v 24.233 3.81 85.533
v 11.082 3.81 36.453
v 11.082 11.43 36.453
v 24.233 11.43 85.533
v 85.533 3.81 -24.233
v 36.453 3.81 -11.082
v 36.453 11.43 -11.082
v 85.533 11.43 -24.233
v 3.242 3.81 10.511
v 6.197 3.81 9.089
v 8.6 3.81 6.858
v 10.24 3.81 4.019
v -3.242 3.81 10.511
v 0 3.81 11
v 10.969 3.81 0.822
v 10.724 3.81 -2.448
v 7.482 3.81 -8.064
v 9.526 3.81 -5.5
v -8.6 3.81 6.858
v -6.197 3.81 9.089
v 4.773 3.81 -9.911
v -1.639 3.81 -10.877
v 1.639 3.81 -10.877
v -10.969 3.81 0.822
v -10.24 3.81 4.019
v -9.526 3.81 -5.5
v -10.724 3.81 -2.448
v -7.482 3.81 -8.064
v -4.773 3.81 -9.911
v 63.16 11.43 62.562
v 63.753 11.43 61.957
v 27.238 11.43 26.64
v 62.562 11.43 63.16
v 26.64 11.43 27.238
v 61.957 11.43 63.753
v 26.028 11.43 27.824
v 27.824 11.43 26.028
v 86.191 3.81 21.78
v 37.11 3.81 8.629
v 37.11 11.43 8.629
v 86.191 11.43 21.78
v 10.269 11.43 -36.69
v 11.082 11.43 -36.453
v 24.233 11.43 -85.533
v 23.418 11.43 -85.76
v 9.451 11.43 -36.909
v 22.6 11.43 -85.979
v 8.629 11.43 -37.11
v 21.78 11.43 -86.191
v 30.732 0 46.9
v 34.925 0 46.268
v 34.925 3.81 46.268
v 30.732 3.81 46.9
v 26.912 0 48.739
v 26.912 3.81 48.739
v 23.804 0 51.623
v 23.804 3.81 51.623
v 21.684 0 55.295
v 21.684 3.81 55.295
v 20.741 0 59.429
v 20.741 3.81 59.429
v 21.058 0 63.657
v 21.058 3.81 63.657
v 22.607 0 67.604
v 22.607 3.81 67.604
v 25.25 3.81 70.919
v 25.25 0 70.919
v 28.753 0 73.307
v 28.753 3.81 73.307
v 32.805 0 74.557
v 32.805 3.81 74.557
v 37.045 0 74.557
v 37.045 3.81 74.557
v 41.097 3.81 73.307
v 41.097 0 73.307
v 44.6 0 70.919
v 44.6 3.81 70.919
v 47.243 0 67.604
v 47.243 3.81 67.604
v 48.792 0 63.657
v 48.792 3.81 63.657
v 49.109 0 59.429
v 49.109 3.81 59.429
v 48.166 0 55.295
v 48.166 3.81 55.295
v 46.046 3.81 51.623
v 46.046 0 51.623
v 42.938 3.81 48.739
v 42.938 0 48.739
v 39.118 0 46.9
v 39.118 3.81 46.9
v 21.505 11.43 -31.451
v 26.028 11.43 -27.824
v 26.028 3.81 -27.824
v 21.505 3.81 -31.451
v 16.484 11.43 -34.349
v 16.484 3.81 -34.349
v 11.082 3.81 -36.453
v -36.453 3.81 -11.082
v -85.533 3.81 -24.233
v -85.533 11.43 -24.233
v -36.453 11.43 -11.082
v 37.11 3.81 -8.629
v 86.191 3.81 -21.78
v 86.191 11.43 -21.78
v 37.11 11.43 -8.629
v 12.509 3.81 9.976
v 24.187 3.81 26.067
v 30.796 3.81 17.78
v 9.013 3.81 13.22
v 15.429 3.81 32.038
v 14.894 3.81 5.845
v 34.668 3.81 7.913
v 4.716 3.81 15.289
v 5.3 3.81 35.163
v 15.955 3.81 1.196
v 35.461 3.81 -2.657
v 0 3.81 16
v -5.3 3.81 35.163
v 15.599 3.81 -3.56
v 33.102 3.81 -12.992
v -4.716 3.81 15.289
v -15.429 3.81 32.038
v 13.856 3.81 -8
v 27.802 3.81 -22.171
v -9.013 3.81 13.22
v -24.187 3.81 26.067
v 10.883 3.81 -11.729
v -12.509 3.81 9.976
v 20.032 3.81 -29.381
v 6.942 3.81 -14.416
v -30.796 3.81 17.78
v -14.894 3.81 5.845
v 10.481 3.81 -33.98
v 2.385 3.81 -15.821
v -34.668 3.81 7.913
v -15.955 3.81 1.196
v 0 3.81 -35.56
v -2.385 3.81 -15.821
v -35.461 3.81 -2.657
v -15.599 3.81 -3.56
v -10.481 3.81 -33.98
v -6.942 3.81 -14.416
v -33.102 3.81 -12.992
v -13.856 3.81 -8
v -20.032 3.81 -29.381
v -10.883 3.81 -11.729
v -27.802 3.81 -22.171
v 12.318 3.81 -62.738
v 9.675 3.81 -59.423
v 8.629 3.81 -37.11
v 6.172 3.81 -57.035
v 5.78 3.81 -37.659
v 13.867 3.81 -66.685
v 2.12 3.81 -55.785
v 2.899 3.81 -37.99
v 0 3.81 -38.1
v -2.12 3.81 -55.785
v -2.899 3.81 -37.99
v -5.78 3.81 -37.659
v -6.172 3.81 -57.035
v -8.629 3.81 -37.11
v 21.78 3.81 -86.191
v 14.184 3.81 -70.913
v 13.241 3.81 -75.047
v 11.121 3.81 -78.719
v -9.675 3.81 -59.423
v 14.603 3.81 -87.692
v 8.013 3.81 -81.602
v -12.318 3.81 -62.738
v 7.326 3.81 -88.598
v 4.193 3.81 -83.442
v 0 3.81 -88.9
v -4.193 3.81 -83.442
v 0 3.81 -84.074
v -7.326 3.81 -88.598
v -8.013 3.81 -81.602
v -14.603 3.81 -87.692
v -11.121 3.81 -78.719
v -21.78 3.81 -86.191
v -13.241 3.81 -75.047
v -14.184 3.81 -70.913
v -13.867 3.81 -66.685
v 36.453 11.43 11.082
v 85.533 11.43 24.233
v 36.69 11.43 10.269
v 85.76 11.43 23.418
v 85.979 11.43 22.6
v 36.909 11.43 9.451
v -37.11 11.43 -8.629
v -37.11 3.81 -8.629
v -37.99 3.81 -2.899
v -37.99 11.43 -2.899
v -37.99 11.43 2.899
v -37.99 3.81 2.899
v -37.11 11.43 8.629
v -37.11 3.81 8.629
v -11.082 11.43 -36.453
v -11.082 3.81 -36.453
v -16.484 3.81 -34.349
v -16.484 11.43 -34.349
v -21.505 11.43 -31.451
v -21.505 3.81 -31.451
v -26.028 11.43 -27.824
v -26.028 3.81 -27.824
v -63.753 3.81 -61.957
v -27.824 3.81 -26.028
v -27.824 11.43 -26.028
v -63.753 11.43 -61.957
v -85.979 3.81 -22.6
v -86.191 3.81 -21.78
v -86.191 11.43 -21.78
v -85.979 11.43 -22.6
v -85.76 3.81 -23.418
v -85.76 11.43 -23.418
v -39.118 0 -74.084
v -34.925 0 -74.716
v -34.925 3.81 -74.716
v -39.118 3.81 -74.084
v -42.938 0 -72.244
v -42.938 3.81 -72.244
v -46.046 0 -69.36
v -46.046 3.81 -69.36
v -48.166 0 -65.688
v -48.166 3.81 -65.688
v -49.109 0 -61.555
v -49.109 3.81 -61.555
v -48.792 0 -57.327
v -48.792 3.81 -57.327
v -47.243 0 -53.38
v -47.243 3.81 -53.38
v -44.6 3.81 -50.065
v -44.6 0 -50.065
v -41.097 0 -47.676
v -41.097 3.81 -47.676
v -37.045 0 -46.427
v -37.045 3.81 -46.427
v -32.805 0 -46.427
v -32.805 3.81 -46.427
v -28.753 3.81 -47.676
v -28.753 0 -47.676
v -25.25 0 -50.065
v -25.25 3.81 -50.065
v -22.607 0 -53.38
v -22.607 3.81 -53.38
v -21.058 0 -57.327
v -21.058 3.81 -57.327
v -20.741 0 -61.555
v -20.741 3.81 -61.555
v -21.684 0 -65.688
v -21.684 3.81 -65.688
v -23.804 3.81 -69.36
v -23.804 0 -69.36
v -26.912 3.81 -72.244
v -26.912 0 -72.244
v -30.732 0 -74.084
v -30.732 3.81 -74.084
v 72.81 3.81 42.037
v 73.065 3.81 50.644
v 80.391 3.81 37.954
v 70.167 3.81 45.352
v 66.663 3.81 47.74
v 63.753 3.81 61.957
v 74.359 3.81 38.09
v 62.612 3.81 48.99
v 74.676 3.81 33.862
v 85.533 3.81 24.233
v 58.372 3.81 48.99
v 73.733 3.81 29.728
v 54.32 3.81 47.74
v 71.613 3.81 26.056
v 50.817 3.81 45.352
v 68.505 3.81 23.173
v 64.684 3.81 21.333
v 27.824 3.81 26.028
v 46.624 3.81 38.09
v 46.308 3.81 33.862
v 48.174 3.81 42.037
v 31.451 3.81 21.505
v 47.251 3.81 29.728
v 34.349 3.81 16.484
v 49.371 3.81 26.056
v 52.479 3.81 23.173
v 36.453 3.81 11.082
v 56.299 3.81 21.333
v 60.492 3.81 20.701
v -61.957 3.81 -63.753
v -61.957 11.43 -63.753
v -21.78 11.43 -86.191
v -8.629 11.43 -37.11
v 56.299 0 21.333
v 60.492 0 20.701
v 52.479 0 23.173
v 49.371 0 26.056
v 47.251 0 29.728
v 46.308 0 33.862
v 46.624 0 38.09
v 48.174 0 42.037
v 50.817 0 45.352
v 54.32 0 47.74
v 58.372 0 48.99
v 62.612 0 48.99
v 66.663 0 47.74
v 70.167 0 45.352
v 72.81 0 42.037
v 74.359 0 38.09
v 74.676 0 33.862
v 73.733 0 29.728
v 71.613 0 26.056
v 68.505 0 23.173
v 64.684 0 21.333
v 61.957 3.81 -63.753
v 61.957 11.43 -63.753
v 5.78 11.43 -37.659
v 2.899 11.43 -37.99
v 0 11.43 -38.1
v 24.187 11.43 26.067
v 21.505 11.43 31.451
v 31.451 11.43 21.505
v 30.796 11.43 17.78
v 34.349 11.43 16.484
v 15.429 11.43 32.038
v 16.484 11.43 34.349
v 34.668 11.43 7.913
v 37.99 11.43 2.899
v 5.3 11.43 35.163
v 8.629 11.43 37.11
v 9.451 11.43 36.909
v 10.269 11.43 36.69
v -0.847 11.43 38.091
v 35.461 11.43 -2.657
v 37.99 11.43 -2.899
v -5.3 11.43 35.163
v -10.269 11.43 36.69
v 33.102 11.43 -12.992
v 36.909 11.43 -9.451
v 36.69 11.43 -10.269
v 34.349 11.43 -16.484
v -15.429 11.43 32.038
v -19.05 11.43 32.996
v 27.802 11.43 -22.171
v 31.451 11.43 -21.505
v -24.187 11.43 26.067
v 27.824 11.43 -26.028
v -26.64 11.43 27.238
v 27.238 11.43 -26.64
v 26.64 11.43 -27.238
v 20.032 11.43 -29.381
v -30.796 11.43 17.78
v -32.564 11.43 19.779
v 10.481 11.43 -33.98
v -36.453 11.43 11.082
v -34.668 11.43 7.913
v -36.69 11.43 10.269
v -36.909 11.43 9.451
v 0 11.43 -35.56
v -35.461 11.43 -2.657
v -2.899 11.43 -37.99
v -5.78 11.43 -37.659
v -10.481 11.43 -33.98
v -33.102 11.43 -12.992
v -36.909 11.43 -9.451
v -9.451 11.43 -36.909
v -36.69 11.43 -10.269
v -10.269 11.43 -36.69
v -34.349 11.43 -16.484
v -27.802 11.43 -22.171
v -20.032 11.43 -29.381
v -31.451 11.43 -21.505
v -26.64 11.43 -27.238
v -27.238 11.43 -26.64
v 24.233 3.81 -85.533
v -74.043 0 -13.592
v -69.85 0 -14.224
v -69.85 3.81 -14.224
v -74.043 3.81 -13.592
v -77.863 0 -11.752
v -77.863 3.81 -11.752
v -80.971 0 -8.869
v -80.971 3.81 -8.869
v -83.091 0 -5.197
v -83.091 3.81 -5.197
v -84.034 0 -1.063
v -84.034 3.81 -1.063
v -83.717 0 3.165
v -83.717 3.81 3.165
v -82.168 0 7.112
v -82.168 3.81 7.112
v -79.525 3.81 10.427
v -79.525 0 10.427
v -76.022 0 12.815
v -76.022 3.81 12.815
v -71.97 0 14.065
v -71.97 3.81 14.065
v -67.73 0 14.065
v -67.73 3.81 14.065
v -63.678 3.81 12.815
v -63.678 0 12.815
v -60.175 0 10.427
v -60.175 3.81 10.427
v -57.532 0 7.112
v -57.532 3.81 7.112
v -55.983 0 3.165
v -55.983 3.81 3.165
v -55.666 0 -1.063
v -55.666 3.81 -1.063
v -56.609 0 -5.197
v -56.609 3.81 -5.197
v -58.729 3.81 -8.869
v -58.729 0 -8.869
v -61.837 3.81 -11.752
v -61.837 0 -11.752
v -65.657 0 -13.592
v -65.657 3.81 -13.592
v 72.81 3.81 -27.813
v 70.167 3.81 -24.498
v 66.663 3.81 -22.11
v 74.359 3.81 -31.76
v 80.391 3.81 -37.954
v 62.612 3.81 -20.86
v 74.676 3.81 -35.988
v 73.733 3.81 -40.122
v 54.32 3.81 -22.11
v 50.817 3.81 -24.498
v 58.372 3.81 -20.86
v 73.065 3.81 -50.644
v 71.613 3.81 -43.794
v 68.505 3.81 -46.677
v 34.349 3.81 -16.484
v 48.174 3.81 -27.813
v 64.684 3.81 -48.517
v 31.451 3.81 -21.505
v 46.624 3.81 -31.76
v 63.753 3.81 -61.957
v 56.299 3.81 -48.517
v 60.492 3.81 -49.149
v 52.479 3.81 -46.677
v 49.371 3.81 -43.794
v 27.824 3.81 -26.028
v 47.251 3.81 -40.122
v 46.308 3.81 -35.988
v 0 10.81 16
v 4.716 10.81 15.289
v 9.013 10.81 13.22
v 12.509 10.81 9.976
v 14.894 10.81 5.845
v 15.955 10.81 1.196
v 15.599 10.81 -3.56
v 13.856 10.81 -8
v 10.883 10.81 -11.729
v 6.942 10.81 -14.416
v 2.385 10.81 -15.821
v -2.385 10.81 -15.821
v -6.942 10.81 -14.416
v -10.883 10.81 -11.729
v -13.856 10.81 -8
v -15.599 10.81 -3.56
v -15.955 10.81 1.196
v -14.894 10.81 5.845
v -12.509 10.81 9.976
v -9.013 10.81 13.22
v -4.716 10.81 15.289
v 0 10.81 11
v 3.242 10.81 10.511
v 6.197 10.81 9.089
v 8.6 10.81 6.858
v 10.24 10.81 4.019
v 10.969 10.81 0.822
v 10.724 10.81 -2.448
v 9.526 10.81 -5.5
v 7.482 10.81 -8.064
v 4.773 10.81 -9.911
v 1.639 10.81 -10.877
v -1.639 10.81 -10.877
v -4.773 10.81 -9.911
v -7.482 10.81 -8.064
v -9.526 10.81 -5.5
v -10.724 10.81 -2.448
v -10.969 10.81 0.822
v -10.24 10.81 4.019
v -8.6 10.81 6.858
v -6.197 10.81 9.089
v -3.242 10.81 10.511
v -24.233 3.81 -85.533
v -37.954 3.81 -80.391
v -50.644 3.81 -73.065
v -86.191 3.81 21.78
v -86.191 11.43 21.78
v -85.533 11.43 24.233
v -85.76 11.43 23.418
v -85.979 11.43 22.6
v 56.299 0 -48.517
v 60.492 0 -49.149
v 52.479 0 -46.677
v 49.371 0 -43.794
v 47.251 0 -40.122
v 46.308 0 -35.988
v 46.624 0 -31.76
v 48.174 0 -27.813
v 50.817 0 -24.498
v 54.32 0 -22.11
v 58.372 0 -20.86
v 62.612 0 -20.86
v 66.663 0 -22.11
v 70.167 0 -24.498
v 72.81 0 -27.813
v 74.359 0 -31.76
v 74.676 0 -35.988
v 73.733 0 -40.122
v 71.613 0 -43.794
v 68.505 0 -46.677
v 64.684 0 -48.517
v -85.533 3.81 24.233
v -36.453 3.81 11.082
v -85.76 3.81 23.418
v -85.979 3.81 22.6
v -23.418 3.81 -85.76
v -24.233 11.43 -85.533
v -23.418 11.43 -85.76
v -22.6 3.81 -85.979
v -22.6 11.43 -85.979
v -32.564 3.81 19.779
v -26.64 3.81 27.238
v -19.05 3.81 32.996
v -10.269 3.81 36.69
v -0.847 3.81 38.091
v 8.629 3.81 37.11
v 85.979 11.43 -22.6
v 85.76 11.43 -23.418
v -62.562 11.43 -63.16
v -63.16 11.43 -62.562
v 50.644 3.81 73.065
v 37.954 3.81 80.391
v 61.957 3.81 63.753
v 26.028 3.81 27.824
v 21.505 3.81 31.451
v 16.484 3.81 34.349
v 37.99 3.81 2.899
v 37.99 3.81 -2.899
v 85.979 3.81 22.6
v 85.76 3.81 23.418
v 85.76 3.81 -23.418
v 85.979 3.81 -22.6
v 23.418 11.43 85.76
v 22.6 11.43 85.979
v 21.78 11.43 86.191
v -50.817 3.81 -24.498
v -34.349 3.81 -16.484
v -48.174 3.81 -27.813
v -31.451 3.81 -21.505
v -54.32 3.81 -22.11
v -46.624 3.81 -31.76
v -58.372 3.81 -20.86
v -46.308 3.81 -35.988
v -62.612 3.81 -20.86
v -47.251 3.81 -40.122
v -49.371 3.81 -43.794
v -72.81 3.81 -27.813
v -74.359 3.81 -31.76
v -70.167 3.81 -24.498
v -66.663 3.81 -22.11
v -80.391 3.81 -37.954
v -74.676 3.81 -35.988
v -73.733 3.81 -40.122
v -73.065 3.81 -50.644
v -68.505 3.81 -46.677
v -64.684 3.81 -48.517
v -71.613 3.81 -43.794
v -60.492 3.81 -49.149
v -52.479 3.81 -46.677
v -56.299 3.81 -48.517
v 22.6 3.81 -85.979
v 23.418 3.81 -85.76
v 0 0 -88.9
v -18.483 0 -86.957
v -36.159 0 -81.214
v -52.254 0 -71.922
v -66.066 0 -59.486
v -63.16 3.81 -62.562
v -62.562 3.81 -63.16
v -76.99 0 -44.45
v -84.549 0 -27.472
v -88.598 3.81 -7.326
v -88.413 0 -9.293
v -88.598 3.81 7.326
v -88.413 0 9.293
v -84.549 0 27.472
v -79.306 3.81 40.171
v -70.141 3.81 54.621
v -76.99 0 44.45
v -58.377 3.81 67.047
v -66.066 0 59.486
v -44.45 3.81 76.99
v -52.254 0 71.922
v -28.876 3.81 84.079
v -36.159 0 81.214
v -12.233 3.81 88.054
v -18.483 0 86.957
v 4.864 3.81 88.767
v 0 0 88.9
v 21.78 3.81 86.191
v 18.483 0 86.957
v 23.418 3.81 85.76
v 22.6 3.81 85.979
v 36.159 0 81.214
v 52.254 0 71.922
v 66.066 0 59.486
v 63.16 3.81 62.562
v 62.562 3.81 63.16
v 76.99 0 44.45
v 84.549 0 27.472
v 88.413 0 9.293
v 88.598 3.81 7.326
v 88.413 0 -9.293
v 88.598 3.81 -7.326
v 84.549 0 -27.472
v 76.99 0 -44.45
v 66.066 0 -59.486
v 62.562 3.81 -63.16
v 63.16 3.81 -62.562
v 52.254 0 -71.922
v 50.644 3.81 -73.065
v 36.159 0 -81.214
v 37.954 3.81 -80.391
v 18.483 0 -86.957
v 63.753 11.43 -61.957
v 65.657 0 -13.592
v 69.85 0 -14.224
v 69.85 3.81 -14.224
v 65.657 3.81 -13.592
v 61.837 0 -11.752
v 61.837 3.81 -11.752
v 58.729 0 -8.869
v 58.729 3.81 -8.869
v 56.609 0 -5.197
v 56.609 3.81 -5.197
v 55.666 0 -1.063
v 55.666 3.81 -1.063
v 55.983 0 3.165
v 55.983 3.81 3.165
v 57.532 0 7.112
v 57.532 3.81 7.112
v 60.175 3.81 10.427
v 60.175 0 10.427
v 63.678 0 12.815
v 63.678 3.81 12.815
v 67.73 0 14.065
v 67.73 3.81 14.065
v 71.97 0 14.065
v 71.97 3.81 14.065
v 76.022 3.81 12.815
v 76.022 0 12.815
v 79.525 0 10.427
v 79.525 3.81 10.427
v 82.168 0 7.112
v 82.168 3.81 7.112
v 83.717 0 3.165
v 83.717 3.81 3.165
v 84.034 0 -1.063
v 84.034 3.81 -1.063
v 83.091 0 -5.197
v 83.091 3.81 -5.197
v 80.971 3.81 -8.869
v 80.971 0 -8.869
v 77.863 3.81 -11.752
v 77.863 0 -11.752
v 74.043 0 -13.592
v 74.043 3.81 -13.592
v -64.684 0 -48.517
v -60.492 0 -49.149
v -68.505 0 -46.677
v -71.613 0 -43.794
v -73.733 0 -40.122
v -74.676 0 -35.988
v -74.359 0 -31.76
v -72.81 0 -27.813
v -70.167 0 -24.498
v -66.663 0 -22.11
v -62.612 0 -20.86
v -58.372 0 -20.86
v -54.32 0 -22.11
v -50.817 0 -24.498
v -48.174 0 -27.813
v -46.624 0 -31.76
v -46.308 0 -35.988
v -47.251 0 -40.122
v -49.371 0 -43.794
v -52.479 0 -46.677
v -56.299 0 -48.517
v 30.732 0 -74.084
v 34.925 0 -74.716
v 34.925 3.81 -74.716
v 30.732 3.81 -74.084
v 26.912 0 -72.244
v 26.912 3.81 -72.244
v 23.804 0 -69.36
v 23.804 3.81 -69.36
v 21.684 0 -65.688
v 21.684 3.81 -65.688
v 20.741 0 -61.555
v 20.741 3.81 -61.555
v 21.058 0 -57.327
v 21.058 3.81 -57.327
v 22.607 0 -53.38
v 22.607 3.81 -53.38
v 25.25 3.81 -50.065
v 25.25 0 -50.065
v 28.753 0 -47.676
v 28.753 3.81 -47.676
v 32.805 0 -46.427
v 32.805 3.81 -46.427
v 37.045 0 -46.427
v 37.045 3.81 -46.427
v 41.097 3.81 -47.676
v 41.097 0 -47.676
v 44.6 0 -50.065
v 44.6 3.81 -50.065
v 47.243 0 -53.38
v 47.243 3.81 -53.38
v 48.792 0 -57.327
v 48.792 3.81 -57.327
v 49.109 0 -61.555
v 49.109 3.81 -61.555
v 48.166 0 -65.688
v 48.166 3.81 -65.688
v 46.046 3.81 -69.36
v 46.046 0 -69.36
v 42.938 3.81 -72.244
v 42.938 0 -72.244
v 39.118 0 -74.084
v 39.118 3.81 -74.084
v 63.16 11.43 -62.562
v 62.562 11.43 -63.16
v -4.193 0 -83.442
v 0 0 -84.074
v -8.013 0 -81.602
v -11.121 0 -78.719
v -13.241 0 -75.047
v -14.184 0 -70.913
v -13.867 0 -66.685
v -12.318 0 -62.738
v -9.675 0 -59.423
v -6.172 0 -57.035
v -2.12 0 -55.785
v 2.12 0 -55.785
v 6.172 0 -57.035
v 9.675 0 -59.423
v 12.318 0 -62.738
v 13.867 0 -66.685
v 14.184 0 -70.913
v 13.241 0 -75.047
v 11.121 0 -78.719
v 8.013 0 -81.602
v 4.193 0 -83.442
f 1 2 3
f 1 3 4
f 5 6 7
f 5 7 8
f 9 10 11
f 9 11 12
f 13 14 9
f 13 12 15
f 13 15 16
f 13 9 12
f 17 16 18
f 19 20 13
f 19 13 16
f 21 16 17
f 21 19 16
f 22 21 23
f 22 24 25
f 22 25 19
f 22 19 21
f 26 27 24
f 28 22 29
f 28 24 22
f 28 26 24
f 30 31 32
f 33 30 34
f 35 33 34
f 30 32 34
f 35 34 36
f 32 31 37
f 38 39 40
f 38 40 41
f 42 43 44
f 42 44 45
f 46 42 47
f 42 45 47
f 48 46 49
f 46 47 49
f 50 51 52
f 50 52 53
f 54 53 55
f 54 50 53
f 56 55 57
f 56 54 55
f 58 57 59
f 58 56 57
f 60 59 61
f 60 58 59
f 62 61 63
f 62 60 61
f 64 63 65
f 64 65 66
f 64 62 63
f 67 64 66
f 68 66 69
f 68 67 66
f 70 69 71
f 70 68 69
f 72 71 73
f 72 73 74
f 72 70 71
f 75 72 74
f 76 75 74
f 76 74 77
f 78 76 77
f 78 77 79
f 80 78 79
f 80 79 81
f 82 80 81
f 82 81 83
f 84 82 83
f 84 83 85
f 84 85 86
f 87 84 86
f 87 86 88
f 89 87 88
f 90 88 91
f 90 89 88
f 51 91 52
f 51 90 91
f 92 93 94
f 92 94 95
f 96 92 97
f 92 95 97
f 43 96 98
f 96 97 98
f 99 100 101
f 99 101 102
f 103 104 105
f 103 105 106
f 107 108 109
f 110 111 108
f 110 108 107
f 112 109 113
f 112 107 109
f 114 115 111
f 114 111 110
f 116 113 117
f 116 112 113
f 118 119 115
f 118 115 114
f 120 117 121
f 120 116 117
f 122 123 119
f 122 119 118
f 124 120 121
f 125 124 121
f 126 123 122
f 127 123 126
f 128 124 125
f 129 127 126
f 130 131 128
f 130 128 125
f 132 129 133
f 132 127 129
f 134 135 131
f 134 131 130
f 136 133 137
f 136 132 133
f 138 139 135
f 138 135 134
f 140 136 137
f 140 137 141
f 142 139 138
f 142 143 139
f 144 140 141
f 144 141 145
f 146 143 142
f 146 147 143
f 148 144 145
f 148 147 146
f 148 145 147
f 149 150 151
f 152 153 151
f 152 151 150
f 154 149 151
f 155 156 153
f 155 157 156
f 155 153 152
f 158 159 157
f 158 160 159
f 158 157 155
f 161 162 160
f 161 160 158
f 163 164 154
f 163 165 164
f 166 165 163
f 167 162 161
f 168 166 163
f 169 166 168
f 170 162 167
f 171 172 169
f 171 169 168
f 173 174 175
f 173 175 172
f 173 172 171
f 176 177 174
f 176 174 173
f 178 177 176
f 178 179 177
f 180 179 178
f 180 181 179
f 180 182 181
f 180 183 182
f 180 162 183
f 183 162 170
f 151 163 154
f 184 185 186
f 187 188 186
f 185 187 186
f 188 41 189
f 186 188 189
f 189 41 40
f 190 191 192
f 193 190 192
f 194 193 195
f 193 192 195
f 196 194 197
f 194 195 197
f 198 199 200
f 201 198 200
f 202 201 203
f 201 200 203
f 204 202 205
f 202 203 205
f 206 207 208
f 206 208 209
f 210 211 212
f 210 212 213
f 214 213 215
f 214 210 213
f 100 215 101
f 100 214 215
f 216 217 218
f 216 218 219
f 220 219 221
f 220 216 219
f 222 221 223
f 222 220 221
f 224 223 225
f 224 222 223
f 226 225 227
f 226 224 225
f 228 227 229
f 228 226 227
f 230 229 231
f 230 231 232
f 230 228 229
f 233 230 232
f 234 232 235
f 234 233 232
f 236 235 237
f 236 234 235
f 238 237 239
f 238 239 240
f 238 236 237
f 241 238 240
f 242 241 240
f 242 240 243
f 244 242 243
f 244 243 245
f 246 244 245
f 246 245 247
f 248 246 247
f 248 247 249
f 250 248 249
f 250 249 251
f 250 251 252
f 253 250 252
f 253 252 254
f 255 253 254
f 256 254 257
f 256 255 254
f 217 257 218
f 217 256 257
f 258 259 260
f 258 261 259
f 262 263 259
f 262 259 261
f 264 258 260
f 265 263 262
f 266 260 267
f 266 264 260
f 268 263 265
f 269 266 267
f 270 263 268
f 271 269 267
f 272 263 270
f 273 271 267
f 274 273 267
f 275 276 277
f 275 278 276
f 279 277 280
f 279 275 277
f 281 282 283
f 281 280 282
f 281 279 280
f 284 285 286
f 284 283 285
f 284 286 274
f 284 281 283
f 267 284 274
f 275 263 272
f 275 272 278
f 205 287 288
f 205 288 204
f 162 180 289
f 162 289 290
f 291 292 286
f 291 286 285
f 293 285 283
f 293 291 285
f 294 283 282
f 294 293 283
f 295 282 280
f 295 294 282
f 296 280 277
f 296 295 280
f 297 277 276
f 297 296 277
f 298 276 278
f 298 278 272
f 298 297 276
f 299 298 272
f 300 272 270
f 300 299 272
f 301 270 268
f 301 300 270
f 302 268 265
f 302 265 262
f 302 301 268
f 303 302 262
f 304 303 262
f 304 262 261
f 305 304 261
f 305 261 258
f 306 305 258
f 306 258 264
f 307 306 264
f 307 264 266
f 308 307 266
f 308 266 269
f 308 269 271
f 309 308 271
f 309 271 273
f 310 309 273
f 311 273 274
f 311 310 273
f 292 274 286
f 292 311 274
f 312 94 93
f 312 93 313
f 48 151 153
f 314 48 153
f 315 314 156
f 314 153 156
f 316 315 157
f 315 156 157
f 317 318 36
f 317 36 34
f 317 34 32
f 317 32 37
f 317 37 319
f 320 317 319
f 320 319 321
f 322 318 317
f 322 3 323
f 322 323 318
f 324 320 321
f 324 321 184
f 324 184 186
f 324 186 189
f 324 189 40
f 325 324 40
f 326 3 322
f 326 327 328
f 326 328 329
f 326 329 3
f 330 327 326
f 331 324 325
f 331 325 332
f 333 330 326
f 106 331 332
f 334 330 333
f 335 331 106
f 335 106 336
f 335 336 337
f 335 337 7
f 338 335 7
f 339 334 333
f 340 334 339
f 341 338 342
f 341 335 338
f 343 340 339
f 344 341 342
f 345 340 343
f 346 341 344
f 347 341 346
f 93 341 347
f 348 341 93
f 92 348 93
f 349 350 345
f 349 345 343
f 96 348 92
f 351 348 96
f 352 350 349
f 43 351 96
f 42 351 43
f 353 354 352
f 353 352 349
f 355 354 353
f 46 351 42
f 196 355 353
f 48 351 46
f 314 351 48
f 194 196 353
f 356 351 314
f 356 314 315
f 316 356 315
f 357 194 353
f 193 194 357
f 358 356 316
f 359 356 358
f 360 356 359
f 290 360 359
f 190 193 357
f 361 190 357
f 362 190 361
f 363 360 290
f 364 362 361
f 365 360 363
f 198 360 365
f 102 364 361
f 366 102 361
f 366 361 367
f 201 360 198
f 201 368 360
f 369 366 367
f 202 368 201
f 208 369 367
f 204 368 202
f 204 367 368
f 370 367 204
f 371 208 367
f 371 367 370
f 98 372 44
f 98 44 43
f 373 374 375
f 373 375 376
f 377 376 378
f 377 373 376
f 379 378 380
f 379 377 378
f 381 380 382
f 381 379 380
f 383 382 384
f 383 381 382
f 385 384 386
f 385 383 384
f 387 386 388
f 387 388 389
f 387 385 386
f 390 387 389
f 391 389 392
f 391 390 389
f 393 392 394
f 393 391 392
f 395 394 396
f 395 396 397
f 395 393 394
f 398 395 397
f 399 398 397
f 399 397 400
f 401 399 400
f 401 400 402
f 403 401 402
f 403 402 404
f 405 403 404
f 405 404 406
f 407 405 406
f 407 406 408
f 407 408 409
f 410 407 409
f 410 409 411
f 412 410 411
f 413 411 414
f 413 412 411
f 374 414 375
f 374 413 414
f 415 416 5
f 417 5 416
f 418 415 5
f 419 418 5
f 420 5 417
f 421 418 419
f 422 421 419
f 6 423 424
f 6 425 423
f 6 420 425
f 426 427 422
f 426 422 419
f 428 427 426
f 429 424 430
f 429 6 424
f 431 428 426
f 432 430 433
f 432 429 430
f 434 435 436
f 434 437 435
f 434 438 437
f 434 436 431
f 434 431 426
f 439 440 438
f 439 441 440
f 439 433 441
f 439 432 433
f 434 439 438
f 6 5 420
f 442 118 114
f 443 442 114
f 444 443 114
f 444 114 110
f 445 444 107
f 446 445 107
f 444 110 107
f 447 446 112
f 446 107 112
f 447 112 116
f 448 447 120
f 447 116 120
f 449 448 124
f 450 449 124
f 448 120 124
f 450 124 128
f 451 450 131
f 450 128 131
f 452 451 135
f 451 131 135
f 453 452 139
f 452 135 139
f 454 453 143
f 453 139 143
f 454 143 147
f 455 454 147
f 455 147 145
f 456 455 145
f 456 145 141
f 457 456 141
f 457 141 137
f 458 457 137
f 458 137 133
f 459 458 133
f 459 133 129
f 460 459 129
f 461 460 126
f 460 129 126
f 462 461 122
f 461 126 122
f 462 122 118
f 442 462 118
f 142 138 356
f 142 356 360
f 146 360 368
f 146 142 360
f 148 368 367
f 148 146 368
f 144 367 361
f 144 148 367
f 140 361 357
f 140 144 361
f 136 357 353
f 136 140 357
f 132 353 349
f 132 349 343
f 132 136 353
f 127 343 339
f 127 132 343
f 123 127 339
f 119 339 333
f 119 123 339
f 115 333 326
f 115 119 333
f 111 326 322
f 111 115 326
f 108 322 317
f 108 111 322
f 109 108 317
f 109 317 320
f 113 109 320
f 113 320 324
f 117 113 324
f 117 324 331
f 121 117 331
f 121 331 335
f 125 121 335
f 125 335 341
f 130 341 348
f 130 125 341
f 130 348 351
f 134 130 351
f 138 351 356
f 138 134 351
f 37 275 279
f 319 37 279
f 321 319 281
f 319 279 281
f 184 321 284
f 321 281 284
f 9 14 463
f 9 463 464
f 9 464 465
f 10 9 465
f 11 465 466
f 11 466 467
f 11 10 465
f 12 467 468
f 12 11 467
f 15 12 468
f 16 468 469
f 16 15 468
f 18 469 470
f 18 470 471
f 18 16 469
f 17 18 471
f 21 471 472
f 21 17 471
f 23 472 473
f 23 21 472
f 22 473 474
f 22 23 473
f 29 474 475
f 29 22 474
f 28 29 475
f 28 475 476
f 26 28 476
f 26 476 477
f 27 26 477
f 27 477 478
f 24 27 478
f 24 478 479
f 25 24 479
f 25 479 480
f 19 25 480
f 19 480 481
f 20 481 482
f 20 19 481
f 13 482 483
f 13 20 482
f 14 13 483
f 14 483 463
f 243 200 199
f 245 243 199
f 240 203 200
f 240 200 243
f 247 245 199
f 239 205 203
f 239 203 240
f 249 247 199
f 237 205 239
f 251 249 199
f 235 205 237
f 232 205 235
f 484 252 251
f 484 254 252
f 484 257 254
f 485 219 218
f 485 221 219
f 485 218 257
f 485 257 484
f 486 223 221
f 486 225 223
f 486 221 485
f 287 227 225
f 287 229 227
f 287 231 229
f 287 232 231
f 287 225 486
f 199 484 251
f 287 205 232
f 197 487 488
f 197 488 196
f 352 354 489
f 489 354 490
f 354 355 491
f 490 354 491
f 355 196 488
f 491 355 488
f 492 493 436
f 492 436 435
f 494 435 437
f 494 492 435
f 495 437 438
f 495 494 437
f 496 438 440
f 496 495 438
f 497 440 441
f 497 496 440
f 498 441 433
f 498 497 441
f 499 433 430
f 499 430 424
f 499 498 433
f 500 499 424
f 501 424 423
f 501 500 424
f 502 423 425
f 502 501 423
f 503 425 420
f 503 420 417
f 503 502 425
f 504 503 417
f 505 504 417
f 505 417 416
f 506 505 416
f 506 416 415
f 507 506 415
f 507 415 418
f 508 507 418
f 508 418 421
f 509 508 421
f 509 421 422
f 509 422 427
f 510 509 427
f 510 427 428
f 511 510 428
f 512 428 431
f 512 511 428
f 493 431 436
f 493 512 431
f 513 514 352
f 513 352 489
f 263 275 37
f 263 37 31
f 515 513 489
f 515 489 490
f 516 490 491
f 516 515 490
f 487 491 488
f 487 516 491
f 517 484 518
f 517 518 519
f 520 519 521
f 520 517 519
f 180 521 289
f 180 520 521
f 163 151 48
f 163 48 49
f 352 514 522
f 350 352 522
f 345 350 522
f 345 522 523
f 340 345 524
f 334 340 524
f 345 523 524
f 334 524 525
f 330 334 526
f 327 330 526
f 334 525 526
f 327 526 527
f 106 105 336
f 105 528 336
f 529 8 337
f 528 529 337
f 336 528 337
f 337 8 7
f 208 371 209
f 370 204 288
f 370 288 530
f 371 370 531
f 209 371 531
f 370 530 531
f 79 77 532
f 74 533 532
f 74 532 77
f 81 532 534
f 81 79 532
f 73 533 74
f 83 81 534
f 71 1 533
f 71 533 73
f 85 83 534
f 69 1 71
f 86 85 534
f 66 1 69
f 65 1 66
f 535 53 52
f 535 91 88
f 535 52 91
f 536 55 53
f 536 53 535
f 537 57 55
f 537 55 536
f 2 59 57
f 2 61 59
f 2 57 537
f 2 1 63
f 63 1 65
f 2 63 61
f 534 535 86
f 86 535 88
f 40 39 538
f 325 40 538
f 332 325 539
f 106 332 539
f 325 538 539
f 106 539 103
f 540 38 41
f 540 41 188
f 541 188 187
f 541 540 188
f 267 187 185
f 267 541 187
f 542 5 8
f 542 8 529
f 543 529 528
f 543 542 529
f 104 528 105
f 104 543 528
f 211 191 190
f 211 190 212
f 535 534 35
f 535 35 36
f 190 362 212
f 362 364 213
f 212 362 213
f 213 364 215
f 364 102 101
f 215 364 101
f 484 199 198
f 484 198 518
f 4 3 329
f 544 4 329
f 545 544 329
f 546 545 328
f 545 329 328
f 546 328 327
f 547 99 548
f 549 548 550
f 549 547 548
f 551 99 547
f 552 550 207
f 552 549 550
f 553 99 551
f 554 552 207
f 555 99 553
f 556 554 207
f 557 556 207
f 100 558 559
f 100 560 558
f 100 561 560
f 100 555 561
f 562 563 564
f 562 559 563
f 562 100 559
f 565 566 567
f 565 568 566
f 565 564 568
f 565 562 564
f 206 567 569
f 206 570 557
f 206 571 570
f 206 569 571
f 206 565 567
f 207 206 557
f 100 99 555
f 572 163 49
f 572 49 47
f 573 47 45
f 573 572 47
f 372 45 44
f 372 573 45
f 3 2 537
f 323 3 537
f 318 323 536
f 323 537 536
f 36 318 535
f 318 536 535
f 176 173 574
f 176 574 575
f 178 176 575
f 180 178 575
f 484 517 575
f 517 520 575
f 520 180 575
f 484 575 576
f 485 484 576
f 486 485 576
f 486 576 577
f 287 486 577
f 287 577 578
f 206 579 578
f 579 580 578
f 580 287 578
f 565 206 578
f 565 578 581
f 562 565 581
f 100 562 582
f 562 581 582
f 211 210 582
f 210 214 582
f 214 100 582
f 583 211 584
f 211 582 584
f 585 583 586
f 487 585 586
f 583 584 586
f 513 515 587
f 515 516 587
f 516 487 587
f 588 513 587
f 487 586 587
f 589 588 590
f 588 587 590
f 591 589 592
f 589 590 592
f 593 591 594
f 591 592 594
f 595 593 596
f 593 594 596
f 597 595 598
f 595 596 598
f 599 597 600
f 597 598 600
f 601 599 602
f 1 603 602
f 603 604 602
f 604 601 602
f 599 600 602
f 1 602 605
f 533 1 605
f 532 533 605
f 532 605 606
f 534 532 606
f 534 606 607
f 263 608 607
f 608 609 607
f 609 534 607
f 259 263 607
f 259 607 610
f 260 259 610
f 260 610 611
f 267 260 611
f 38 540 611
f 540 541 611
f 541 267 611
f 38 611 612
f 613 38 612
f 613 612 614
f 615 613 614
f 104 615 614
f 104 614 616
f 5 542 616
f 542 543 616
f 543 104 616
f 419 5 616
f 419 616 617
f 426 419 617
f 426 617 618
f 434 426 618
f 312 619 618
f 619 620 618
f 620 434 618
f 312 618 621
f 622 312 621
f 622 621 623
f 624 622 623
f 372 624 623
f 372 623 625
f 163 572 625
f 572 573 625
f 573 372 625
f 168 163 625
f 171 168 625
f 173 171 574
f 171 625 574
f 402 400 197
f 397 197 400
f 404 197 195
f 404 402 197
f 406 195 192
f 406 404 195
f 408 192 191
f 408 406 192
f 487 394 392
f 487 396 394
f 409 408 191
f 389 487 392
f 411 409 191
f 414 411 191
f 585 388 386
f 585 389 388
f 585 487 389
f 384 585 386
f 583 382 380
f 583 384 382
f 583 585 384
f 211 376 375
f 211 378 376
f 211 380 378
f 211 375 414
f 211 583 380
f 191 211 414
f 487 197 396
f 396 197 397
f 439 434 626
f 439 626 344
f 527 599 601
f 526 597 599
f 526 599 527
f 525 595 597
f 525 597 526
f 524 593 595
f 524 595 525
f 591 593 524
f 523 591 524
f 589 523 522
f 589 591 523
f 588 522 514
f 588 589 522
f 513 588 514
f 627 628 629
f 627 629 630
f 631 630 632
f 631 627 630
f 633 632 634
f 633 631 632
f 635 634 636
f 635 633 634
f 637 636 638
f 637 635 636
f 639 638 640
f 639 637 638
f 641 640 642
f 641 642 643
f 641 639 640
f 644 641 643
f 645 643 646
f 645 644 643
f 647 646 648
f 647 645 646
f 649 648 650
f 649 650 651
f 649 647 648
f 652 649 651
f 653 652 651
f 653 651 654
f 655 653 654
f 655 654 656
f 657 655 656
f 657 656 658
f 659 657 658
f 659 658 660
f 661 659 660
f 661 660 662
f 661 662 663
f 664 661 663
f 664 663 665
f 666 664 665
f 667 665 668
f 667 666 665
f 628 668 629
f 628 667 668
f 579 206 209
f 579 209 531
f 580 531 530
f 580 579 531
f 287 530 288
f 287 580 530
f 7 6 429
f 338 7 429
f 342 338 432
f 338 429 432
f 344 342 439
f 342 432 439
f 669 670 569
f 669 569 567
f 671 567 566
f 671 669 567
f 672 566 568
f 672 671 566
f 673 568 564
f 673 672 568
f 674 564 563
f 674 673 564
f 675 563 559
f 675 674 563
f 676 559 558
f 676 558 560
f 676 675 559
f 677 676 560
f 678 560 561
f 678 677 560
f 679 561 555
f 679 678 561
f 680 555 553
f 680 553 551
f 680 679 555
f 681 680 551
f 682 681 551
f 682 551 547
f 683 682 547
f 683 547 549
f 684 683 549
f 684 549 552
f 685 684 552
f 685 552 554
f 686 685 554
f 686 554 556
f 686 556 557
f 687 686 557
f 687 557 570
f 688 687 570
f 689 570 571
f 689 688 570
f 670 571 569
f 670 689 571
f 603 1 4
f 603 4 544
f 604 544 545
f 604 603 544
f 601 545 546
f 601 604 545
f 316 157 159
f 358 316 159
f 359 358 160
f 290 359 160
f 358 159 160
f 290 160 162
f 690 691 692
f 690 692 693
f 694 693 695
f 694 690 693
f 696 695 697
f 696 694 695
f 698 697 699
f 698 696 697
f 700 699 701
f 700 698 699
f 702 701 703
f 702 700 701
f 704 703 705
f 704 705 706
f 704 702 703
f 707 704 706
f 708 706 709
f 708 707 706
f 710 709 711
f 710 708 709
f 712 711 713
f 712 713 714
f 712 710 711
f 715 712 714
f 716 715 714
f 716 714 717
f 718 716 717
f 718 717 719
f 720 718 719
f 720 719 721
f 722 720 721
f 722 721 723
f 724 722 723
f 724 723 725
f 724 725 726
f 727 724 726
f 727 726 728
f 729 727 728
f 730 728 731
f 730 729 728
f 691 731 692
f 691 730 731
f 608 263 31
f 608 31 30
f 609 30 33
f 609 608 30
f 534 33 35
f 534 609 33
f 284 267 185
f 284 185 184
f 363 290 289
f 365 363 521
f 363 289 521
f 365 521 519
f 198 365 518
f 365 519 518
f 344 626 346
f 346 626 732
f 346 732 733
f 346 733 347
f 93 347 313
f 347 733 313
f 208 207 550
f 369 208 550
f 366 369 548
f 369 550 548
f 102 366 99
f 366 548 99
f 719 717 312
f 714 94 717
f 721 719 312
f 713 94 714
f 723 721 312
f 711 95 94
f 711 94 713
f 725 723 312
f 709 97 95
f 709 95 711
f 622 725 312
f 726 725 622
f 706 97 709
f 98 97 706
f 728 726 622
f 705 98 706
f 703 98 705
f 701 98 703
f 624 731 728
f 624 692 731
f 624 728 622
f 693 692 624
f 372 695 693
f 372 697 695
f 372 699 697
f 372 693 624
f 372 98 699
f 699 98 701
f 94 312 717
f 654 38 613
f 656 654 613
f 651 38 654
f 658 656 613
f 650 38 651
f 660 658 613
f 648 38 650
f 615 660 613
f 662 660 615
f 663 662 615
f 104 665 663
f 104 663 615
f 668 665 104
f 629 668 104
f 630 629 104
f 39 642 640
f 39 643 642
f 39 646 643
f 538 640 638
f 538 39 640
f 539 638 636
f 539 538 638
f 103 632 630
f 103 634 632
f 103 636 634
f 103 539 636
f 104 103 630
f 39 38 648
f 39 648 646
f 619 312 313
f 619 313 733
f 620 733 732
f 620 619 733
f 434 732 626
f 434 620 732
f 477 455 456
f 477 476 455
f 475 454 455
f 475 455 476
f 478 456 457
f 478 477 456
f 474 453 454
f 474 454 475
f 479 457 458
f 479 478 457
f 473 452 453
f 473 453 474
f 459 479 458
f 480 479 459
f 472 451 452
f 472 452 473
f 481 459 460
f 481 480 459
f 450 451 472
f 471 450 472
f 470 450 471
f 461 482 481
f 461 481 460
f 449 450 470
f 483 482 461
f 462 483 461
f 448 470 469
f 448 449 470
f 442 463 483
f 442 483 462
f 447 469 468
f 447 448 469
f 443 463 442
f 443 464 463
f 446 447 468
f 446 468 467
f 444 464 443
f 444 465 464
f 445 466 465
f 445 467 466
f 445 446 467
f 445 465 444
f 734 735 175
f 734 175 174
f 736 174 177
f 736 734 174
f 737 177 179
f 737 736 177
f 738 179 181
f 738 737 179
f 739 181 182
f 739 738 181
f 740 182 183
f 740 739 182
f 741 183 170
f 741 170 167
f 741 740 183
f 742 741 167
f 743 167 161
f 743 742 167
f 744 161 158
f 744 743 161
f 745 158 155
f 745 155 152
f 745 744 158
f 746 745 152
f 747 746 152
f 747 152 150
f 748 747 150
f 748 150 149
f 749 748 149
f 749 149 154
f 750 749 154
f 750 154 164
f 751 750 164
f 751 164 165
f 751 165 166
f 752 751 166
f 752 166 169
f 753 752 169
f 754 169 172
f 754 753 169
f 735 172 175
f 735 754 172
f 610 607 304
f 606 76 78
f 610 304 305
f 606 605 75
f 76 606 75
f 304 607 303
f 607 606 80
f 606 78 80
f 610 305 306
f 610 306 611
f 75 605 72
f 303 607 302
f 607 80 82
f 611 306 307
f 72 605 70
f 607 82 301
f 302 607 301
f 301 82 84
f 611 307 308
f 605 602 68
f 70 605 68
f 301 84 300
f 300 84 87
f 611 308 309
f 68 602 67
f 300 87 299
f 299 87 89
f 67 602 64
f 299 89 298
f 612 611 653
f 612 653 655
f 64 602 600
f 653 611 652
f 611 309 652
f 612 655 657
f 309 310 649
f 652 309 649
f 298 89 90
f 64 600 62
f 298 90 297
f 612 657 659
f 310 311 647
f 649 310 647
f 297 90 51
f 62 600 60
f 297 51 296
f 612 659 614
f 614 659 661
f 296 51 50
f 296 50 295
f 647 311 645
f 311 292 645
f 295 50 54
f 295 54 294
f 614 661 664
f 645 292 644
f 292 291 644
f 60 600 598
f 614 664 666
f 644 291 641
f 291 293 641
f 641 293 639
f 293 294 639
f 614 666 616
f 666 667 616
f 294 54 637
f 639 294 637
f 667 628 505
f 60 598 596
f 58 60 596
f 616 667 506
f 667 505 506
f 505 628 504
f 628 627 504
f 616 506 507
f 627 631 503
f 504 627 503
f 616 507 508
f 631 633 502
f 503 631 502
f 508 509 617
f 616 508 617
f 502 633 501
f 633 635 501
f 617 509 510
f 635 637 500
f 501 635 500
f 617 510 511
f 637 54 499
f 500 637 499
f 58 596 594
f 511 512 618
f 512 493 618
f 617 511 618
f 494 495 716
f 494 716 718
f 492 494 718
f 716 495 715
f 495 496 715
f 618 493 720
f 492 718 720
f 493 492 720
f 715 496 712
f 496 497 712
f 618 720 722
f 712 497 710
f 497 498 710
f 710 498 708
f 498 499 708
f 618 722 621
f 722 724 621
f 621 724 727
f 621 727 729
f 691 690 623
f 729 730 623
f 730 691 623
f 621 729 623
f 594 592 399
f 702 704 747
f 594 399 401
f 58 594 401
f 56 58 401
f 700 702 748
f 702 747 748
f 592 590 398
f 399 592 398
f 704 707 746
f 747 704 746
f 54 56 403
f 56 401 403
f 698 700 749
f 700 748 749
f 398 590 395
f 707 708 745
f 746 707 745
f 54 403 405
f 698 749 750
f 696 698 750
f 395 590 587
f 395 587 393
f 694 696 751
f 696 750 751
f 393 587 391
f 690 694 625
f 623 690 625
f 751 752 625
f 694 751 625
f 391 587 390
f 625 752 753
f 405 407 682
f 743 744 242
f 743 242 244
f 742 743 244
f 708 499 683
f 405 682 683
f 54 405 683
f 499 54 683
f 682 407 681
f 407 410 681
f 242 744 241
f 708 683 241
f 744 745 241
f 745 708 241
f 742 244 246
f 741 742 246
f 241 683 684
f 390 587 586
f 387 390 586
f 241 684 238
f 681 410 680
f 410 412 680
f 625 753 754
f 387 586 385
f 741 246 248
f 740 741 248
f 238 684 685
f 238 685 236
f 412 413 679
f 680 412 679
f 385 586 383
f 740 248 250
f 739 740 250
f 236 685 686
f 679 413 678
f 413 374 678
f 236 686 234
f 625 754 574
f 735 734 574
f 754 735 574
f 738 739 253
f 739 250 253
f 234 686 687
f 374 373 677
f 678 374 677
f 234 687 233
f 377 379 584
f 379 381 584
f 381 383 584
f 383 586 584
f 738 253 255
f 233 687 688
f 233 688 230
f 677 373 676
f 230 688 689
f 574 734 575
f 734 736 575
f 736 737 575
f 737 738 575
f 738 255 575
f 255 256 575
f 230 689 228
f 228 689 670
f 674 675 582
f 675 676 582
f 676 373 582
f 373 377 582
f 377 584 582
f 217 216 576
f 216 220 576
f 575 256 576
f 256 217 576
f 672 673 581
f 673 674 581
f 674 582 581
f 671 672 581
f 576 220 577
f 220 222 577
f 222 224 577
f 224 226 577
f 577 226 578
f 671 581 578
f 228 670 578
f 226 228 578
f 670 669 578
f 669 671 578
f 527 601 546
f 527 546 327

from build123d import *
from build123d.topology import SkipClean

# Parameters (mm, degrees)
SKETCH1_R           = 88.9
SKETCH1_R_2         = 14.224
BOSS_EXTRUDE1_DEPTH = 3.81
SKETCH3_R           = 38.1
SKETCH3_R_2         = 35.56
BOSS_EXTRUDE3_DEPTH = 7.62
BOSS_EXTRUDE4_DEPTH = 7.62
SKETCH4_R           = 16
SKETCH4_R_2         = 11
BOSS_EXTRUDE5_DEPTH = 7


with BuildPart() as part:
    # Sketch1 → Boss-Extrude1 (new body)
    with BuildSketch(Plane(origin=(0, 0, 0), x_dir=(1, 0, 0), z_dir=(0, 1, 0))):
        with Locations(Location((0, 0, 0), (0, 0, 90))):
            Circle(SKETCH1_R)
        with Locations(Location((-69.85, 0, 0), (0, 0, 90))):
            Circle(SKETCH1_R_2, mode=Mode.SUBTRACT)
        with Locations(Location((-60.491874454, 34.925, 0), (0, 0, 90))):
            Circle(SKETCH1_R_2, mode=Mode.SUBTRACT)
        with Locations(Location((-34.925, 60.491874454, 0), (0, 0, 90))):
            Circle(SKETCH1_R_2, mode=Mode.SUBTRACT)
        with Locations(Location((0, 69.85, 0), (0, 0, 90))):
            Circle(SKETCH1_R_2, mode=Mode.SUBTRACT)
        with Locations(Location((34.925, 60.491874454, 0), (0, 0, 90))):
            Circle(SKETCH1_R_2, mode=Mode.SUBTRACT)
        with Locations(Location((60.491874454, 34.925, 0), (0, 0, 90))):
            Circle(SKETCH1_R_2, mode=Mode.SUBTRACT)
        with Locations(Location((69.85, 0, 0), (0, 0, 90))):
            Circle(SKETCH1_R_2, mode=Mode.SUBTRACT)
        with Locations(Location((60.491874454, -34.925, 0), (0, 0, 90))):
            Circle(SKETCH1_R_2, mode=Mode.SUBTRACT)
        with Locations(Location((34.925, -60.491874454, 0), (0, 0, 90))):
            Circle(SKETCH1_R_2, mode=Mode.SUBTRACT)
    extrude(amount=BOSS_EXTRUDE1_DEPTH)

    # Sketch3 → Boss-Extrude3 (add)
    with BuildSketch(Plane(origin=(0, 3.81, 0), x_dir=(1, 0, 0), z_dir=(0, 1, 0))):
        with Locations(Location((0, 0, 0), (0, 0, 90))):
            Circle(SKETCH3_R)
        with Locations(Location((0, 0, 0), (0, 0, 90))):
            Circle(SKETCH3_R_2, mode=Mode.SUBTRACT)
    extrude(amount=BOSS_EXTRUDE3_DEPTH)

    # Sketch2 → Boss-Extrude4 (add)
    with SkipClean():  # the faces are left unmerged after this step: merging them gives an invalid solid
        with BuildSketch(Plane(origin=(0, 3.81, 0), x_dir=(1, 0, 0), z_dir=(0, 1, 0))):
            with BuildLine():
                Line((-86.19074337, -21.779939332), (-37.110023056, -8.62879996))
                ThreePointArc((-37.110023056, -8.62879996), (-36.801773982, -9.861005618), (-36.452622682, -11.082251559))
                Line((-36.452622682, -11.082251559), (-85.533342996, -24.233390931))
                ThreePointArc((-85.533342996, -24.233390931), (-85.870805957, -23.00901311), (-86.19074337, -21.779939332))
            make_face()
            with BuildLine():
                Line((-85.533342996, 24.233390931), (-36.452622682, 11.082251559))
                ThreePointArc((-36.452622682, 11.082251559), (-36.801773982, 9.861005618), (-37.110023056, 8.62879996))
                Line((-37.110023056, 8.62879996), (-86.19074337, 21.779939332))
                ThreePointArc((-86.19074337, 21.779939332), (-85.870805957, 23.00901311), (-85.533342996, 24.233390931))
            make_face()
            with BuildLine():
                Line((-61.957352439, 63.753403664), (-26.027771498, 27.823822722))
                ThreePointArc((-26.027771498, 27.823822722), (-26.940768363, 26.940768363), (-27.823822722, 26.027771498))
                Line((-27.823822722, 26.027771498), (-63.753403664, 61.957352439))
                ThreePointArc((-63.753403664, 61.957352439), (-62.861792847, 62.861792847), (-61.957352439, 63.753403664))
            make_face()
            with BuildLine():
                Line((-21.779939332, 86.19074337), (-8.62879996, 37.110023056))
                ThreePointArc((-8.62879996, 37.110023056), (-9.861005618, 36.801773982), (-11.082251559, 36.452622682))
                Line((-11.082251559, 36.452622682), (-24.233390931, 85.533342996))
                ThreePointArc((-24.233390931, 85.533342996), (-23.00901311, 85.870805957), (-21.779939332, 86.19074337))
            make_face()
            with BuildLine():
                Line((24.233390931, 85.533342996), (11.082251559, 36.452622682))
                ThreePointArc((11.082251559, 36.452622682), (9.861005618, 36.801773982), (8.62879996, 37.110023056))
                Line((8.62879996, 37.110023056), (21.779939332, 86.19074337))
                ThreePointArc((21.779939332, 86.19074337), (23.00901311, 85.870805957), (24.233390931, 85.533342996))
            make_face()
            with BuildLine():
                Line((63.753403664, 61.957352439), (27.823822722, 26.027771498))
                ThreePointArc((27.823822722, 26.027771498), (26.940768363, 26.940768363), (26.027771498, 27.823822722))
                Line((26.027771498, 27.823822722), (61.957352439, 63.753403664))
                ThreePointArc((61.957352439, 63.753403664), (62.861792847, 62.861792847), (63.753403664, 61.957352439))
            make_face()
            with BuildLine():
                Line((86.19074337, 21.779939332), (37.110023056, 8.62879996))
                ThreePointArc((37.110023056, 8.62879996), (36.801773982, 9.861005618), (36.452622682, 11.082251559))
                Line((36.452622682, 11.082251559), (85.533342996, 24.233390931))
                ThreePointArc((85.533342996, 24.233390931), (85.870805957, 23.00901311), (86.19074337, 21.779939332))
            make_face()
            with BuildLine():
                Line((85.533342996, -24.233390931), (36.452622682, -11.082251559))
                ThreePointArc((36.452622682, -11.082251559), (36.801773982, -9.861005618), (37.110023056, -8.62879996))
                Line((37.110023056, -8.62879996), (86.19074337, -21.779939332))
                ThreePointArc((86.19074337, -21.779939332), (85.870805957, -23.00901311), (85.533342996, -24.233390931))
            make_face()
            with BuildLine():
                Line((61.957352439, -63.753403664), (26.027771498, -27.823822722))
                ThreePointArc((26.027771498, -27.823822722), (26.940768363, -26.940768363), (27.823822722, -26.027771498))
                Line((27.823822722, -26.027771498), (63.753403664, -61.957352439))
                ThreePointArc((63.753403664, -61.957352439), (62.861792847, -62.861792847), (61.957352439, -63.753403664))
            make_face()
            with BuildLine():
                Line((21.779939332, -86.19074337), (8.62879996, -37.110023056))
                ThreePointArc((8.62879996, -37.110023056), (9.861005618, -36.801773982), (11.082251559, -36.452622682))
                Line((11.082251559, -36.452622682), (24.233390931, -85.533342996))
                ThreePointArc((24.233390931, -85.533342996), (23.00901311, -85.870805957), (21.779939332, -86.19074337))
            make_face()
        extrude(amount=BOSS_EXTRUDE4_DEPTH)

    # Sketch4 → Boss-Extrude5 (add)
    with SkipClean():  # the faces are left unmerged after this step: merging them gives an invalid solid
        with BuildSketch(Plane(origin=(0, 3.81, 0), x_dir=(1, 0, 0), z_dir=(0, 1, 0))):
            with Locations(Location((0, 0, 0), (0, 0, 270))):
                Circle(SKETCH4_R)
            with Locations(Location((0, 0, 0), (0, 0, 270))):
                Circle(SKETCH4_R_2, mode=Mode.SUBTRACT)
        extrude(amount=BOSS_EXTRUDE5_DEPTH)


solid = part.part
